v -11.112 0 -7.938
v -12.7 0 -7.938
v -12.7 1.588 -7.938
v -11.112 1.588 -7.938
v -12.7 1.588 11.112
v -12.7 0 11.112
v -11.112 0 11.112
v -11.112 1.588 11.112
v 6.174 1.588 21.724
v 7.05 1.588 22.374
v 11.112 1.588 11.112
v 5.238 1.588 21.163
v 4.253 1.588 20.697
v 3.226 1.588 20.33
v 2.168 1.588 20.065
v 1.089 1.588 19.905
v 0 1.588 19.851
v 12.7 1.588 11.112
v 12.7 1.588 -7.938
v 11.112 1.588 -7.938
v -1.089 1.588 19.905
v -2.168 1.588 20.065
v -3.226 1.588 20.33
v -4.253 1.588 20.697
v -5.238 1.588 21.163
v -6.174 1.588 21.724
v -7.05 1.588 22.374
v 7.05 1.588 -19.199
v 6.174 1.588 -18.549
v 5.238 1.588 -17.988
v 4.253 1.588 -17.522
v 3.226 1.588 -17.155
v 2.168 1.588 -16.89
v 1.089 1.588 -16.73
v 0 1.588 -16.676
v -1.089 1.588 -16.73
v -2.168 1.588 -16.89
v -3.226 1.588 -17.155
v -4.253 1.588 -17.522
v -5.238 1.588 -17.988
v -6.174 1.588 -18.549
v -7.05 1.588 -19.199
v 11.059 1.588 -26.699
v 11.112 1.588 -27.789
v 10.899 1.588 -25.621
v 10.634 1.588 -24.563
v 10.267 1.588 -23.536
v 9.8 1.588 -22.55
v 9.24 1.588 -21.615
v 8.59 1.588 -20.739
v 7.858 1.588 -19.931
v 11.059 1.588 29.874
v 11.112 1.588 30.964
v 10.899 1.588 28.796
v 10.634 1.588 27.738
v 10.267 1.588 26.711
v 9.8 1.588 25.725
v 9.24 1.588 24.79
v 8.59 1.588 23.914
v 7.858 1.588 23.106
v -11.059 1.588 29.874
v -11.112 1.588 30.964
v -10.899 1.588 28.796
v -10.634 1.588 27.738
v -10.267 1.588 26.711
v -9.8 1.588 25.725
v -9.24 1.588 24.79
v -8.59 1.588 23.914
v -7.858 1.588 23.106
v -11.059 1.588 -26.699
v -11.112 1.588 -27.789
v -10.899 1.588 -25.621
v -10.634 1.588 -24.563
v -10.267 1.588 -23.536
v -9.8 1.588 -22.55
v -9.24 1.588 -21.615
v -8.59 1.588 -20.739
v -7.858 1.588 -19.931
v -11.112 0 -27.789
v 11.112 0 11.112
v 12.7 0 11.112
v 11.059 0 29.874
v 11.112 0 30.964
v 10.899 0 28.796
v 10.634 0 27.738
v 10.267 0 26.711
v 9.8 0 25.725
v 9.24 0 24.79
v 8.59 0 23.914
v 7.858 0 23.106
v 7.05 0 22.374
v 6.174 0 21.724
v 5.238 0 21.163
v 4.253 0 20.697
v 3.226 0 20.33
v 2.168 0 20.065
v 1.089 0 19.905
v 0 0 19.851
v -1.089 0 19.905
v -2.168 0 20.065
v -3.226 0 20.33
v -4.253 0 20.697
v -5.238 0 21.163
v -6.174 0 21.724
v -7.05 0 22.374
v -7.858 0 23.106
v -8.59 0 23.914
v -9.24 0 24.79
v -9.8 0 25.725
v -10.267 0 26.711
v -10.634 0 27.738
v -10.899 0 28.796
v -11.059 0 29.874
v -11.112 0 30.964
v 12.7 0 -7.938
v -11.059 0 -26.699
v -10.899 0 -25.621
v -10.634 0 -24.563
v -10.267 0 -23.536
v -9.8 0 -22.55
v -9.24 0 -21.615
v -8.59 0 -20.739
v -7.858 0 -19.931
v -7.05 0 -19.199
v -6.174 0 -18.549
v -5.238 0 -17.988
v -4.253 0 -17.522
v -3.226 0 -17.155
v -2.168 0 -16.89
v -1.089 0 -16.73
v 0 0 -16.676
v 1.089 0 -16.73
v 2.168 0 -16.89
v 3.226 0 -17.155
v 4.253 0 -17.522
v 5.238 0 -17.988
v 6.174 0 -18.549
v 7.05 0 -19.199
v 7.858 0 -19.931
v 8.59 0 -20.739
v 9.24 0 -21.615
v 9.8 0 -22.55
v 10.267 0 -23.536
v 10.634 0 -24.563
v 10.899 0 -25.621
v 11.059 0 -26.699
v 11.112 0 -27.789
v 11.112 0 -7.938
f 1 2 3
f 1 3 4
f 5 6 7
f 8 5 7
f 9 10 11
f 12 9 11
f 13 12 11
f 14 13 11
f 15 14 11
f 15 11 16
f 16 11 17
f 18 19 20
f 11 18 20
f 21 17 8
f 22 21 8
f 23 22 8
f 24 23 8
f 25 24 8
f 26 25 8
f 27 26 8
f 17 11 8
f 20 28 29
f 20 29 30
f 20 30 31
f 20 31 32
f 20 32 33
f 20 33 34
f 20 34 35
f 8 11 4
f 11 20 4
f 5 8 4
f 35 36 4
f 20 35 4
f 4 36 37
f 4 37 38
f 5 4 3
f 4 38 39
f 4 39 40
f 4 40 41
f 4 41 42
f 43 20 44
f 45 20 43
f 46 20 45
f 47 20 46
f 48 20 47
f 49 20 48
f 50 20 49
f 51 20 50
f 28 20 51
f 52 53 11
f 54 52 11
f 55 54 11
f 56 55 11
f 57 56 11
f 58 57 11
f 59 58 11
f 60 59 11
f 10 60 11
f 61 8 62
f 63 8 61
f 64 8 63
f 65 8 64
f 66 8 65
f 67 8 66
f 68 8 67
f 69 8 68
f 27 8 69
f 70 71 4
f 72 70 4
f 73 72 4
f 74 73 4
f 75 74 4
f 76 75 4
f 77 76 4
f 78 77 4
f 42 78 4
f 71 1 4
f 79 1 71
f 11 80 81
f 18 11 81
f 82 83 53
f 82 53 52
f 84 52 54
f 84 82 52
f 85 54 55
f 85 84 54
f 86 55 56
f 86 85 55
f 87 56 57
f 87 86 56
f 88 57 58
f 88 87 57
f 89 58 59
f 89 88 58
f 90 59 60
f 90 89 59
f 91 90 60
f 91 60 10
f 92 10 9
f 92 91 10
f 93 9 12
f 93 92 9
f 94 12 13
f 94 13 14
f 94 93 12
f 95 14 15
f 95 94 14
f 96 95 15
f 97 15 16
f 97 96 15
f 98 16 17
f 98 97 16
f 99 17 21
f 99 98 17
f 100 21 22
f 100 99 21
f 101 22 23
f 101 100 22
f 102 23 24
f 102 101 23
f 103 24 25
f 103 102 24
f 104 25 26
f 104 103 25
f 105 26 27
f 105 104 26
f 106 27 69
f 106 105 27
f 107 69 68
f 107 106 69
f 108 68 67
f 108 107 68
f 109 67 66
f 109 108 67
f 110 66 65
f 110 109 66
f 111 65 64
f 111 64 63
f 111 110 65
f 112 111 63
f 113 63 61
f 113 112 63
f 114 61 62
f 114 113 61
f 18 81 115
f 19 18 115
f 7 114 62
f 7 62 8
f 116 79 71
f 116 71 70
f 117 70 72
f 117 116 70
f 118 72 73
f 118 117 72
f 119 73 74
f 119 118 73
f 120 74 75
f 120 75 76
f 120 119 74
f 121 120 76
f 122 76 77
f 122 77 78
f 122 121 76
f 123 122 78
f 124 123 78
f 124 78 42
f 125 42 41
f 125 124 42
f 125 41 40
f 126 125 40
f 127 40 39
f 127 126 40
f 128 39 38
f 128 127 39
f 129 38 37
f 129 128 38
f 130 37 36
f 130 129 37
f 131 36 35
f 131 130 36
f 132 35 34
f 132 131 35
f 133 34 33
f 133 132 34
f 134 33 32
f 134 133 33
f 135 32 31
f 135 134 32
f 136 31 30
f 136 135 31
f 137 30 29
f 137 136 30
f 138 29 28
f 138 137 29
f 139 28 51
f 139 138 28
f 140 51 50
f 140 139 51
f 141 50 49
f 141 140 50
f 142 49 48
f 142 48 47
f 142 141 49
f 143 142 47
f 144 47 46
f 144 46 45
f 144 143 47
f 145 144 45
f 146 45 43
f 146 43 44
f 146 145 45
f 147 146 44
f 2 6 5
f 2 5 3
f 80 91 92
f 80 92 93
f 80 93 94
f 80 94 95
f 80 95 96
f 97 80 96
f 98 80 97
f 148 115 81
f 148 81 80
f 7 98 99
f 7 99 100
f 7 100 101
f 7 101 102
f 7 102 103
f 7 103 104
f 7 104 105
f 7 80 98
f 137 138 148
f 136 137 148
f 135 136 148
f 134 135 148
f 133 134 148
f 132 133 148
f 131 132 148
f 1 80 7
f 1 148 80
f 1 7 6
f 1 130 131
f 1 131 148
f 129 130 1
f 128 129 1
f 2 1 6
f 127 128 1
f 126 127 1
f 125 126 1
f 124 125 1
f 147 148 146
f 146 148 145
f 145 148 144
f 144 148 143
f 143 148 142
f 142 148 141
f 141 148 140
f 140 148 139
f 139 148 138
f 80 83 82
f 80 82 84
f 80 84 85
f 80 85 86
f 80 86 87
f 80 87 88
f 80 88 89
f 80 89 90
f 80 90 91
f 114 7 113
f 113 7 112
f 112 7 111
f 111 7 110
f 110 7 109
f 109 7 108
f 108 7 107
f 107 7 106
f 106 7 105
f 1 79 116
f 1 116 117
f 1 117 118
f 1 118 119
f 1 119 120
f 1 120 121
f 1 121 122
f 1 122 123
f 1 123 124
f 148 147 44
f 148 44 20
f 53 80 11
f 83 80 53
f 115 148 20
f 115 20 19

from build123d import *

# Parameters (mm, degrees)
SKETCH1_W           = 1.5875
SKETCH1_H           = 19.05
BOSS_EXTRUDE1_DEPTH = 1.5875


with BuildPart() as part:
    # Sketch1 → Boss-Extrude1 (new body)
    with BuildSketch(Plane(origin=(0, 0, 0), x_dir=(1, 0, 0), z_dir=(0, 1, 0))):
        with BuildLine():
            Line((11.1125, 27.788669701), (11.1125, -30.963669701))
            ThreePointArc((11.1125, -30.963669701), (0, -19.851169701), (-11.1125, -30.963669701))
            Line((-11.1125, -30.963669701), (-11.1125, 27.788669701))
            ThreePointArc((-11.1125, 27.788669701), (0, 16.676169701), (11.1125, 27.788669701))
        make_face()
        with Locations((11.90625, -1.5875)):
            Rectangle(SKETCH1_W, SKETCH1_H)
        with Locations((-11.90625, -1.5875)):
            Rectangle(SKETCH1_W, SKETCH1_H)
    extrude(amount=BOSS_EXTRUDE1_DEPTH)


solid = part.part
